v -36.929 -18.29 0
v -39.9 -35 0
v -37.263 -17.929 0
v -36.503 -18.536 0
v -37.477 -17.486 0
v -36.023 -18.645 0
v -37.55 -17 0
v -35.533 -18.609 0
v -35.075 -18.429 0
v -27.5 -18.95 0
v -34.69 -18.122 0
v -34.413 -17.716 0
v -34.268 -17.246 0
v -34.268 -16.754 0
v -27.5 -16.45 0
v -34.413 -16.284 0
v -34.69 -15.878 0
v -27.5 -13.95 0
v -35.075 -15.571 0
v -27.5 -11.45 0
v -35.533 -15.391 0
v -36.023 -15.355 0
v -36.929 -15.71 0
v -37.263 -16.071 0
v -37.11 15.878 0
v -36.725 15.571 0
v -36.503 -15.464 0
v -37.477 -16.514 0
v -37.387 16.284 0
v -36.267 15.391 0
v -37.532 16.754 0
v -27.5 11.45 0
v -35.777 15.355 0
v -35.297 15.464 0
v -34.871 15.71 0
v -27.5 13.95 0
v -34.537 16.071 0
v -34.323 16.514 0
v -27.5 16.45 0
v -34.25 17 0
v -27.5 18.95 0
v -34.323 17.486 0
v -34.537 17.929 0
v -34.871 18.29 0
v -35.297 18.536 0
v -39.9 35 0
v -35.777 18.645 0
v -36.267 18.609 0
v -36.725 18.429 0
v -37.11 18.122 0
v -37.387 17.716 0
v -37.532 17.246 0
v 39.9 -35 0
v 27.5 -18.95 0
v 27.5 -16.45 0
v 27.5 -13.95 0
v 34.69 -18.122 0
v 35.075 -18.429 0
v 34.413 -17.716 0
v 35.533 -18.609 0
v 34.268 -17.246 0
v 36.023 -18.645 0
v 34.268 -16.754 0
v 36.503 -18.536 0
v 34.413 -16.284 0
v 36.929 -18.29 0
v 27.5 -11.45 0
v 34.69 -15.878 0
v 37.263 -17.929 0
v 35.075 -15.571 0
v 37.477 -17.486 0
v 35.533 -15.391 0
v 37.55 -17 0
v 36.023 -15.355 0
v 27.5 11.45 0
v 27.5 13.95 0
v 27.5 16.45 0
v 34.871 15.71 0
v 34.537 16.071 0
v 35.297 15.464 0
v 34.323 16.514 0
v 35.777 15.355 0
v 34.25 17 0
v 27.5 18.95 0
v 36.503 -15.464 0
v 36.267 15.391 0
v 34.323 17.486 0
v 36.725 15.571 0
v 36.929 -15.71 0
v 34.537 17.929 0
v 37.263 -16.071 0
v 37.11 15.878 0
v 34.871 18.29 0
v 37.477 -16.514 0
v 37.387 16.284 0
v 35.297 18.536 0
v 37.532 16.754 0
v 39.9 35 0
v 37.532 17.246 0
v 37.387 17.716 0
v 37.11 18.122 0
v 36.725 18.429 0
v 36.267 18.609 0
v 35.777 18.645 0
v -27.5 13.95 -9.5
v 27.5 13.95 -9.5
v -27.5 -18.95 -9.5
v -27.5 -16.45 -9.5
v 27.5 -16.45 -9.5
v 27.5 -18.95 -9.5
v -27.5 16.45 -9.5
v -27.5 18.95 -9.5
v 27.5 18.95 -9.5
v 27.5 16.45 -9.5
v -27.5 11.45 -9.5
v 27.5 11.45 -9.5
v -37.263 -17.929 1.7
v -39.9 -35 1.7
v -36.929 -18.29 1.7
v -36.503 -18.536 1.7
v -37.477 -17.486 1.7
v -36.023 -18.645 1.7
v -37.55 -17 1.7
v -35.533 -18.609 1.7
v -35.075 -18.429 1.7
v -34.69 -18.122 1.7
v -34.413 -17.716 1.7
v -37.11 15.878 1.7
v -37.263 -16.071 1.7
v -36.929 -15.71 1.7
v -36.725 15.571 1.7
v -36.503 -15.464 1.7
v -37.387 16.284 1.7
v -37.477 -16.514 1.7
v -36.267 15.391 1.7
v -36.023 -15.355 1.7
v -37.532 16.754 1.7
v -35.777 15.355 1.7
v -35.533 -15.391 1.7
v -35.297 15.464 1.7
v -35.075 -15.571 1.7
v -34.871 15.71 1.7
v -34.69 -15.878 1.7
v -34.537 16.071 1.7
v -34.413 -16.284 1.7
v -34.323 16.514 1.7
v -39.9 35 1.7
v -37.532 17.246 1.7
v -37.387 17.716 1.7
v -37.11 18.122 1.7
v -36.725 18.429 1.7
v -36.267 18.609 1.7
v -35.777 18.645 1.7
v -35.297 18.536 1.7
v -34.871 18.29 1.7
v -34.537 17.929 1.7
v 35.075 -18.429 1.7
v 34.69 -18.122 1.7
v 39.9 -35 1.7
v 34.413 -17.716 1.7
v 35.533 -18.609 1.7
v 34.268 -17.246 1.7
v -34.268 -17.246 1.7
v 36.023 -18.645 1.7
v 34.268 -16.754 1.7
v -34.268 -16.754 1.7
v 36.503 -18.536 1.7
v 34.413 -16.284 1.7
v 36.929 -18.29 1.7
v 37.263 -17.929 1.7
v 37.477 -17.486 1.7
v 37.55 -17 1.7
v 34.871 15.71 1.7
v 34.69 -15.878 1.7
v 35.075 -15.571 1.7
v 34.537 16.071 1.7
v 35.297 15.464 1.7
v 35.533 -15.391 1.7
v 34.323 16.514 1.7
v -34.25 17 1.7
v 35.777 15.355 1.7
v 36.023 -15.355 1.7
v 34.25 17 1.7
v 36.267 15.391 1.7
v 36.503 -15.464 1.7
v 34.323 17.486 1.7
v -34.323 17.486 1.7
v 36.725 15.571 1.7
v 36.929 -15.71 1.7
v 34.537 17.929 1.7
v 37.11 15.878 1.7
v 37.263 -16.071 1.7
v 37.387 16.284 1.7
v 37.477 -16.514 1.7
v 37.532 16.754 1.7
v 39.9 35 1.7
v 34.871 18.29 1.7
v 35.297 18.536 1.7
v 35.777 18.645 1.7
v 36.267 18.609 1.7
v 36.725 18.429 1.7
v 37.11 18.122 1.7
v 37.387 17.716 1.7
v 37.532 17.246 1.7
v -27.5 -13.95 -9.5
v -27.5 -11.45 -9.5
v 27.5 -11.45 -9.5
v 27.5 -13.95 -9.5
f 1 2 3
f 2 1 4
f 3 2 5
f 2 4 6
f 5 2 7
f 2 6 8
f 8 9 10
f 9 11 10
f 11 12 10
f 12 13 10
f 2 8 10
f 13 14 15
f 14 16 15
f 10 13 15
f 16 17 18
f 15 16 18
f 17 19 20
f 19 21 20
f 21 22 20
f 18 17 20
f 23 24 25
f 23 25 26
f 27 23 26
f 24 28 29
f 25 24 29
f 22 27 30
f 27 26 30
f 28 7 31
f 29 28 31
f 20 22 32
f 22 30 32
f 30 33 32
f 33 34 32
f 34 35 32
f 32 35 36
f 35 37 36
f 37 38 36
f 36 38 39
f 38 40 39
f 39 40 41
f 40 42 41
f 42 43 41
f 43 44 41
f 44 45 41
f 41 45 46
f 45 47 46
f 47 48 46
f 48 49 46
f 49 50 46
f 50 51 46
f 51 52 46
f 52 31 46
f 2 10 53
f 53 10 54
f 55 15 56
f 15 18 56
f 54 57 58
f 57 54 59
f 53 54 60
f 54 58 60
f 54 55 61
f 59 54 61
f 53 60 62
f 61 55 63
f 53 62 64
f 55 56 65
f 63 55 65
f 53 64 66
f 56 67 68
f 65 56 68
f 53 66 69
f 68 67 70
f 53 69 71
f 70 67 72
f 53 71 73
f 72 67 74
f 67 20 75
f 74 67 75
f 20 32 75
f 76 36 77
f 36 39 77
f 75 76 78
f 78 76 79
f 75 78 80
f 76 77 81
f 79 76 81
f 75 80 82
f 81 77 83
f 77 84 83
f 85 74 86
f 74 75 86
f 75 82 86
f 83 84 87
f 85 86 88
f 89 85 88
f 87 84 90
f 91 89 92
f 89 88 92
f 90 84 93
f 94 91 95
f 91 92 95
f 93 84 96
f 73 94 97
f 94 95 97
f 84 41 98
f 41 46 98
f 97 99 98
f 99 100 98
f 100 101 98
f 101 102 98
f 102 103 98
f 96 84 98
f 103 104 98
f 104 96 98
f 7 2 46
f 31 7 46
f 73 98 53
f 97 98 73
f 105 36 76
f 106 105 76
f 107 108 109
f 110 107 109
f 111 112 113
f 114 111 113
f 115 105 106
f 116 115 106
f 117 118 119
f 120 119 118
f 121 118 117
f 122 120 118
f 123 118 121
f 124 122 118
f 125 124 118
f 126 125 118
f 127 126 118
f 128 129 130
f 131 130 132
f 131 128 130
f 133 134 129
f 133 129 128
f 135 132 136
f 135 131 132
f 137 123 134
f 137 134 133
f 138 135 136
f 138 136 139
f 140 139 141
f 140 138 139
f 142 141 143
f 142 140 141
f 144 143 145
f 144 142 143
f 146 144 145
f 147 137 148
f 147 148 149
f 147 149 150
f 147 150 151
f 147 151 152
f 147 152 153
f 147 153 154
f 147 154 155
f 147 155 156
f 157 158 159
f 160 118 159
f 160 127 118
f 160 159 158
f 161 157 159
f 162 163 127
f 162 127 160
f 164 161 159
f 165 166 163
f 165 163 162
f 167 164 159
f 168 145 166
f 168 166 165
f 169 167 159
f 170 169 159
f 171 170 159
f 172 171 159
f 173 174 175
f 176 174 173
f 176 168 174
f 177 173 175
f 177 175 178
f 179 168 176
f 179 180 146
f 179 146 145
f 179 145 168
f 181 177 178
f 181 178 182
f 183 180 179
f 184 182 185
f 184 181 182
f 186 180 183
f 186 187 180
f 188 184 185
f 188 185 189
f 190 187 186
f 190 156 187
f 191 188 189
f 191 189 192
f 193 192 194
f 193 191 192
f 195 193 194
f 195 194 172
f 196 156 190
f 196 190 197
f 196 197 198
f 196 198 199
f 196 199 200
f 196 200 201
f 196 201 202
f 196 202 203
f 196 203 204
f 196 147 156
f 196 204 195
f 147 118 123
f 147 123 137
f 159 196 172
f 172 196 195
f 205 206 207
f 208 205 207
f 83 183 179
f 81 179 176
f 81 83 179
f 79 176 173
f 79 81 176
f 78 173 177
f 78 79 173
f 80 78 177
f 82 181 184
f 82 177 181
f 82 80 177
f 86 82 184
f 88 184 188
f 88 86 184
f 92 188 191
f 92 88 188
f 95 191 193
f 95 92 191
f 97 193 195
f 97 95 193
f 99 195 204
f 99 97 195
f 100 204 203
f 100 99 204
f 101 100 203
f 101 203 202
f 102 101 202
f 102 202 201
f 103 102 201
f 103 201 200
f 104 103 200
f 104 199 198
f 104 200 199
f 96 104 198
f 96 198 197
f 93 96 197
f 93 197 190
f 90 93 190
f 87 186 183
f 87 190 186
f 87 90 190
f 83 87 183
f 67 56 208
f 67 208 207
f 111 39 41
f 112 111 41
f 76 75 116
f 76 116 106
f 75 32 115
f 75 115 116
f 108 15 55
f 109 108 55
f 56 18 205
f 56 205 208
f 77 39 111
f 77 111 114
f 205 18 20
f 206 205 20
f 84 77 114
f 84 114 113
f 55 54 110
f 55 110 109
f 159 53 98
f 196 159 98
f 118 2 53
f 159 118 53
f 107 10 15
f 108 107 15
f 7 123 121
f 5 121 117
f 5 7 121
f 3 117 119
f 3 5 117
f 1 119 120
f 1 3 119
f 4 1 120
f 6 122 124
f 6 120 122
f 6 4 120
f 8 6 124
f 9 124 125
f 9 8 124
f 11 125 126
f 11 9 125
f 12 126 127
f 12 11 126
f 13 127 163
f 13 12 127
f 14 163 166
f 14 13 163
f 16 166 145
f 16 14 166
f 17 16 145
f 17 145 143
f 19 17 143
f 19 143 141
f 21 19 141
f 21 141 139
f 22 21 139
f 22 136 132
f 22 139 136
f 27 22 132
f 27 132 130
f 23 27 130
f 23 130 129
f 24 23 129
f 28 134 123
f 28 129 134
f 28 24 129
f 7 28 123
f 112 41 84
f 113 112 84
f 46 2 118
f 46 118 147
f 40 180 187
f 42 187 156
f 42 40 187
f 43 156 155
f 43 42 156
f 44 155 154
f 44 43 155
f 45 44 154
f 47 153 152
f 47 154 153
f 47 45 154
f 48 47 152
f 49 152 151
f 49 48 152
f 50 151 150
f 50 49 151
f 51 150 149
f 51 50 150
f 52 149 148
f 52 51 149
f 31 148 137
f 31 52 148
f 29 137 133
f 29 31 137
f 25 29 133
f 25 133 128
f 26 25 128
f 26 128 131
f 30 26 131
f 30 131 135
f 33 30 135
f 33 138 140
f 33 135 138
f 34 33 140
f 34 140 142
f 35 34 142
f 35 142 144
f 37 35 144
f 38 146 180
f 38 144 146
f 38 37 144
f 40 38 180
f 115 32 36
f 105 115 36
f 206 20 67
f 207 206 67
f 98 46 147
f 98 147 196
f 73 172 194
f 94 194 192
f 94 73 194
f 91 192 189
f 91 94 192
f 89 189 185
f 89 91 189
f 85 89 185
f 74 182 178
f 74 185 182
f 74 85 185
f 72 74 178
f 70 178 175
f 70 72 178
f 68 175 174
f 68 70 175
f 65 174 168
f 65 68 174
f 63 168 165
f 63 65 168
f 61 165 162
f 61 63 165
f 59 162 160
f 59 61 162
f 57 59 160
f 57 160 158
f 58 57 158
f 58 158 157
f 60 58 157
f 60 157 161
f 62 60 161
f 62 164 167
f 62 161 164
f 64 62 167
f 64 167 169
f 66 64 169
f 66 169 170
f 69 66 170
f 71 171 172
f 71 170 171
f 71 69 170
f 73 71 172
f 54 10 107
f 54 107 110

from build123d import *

# Parameters (mm, degrees)
SKETCH1_W           = 79.8
SKETCH1_H           = 70
BOSS_EXTRUDE1_DEPTH = 1.7
SKETCH1_3_W         = 55
SKETCH1_3_H         = 2.5
BOSS_EXTRUDE2_DEPTH = 9.5
SKETCH1_4_R         = 1.65
CUT_EXTRUDE1_DEPTH  = 54.919013344


with BuildPart() as part:
    # Sketch1 → Boss-Extrude1 (new body)
    with BuildSketch(Plane.XY):
        Rectangle(SKETCH1_W, SKETCH1_H)
    extrude(amount=BOSS_EXTRUDE1_DEPTH)

    # Sketch1<3> → Boss-Extrude2 (add)
    with BuildSketch(Plane.XY):
        with Locations((0, -12.7)):
            Rectangle(SKETCH1_3_W, SKETCH1_3_H)
        with Locations((0, 12.7)):
            Rectangle(SKETCH1_3_W, SKETCH1_3_H)
        with Locations((0, -17.7)):
            Rectangle(SKETCH1_3_W, SKETCH1_3_H)
        with Locations((0, 17.7)):
            Rectangle(SKETCH1_3_W, SKETCH1_3_H)
    extrude(amount=-BOSS_EXTRUDE2_DEPTH)

    # Sketch1<4> → Cut-Extrude1 (cut, through all)
    with BuildSketch(Plane.XY):
        with Locations((-35.9, 17)):
            Circle(SKETCH1_4_R)
        with Locations((35.9, 17)):
            Circle(SKETCH1_4_R)
        with Locations((35.9, -17)):
            Circle(SKETCH1_4_R)
        with Locations((-35.9, -17)):
            Circle(SKETCH1_4_R)
    extrude(amount=CUT_EXTRUDE1_DEPTH, mode=Mode.SUBTRACT)


solid = part.part
